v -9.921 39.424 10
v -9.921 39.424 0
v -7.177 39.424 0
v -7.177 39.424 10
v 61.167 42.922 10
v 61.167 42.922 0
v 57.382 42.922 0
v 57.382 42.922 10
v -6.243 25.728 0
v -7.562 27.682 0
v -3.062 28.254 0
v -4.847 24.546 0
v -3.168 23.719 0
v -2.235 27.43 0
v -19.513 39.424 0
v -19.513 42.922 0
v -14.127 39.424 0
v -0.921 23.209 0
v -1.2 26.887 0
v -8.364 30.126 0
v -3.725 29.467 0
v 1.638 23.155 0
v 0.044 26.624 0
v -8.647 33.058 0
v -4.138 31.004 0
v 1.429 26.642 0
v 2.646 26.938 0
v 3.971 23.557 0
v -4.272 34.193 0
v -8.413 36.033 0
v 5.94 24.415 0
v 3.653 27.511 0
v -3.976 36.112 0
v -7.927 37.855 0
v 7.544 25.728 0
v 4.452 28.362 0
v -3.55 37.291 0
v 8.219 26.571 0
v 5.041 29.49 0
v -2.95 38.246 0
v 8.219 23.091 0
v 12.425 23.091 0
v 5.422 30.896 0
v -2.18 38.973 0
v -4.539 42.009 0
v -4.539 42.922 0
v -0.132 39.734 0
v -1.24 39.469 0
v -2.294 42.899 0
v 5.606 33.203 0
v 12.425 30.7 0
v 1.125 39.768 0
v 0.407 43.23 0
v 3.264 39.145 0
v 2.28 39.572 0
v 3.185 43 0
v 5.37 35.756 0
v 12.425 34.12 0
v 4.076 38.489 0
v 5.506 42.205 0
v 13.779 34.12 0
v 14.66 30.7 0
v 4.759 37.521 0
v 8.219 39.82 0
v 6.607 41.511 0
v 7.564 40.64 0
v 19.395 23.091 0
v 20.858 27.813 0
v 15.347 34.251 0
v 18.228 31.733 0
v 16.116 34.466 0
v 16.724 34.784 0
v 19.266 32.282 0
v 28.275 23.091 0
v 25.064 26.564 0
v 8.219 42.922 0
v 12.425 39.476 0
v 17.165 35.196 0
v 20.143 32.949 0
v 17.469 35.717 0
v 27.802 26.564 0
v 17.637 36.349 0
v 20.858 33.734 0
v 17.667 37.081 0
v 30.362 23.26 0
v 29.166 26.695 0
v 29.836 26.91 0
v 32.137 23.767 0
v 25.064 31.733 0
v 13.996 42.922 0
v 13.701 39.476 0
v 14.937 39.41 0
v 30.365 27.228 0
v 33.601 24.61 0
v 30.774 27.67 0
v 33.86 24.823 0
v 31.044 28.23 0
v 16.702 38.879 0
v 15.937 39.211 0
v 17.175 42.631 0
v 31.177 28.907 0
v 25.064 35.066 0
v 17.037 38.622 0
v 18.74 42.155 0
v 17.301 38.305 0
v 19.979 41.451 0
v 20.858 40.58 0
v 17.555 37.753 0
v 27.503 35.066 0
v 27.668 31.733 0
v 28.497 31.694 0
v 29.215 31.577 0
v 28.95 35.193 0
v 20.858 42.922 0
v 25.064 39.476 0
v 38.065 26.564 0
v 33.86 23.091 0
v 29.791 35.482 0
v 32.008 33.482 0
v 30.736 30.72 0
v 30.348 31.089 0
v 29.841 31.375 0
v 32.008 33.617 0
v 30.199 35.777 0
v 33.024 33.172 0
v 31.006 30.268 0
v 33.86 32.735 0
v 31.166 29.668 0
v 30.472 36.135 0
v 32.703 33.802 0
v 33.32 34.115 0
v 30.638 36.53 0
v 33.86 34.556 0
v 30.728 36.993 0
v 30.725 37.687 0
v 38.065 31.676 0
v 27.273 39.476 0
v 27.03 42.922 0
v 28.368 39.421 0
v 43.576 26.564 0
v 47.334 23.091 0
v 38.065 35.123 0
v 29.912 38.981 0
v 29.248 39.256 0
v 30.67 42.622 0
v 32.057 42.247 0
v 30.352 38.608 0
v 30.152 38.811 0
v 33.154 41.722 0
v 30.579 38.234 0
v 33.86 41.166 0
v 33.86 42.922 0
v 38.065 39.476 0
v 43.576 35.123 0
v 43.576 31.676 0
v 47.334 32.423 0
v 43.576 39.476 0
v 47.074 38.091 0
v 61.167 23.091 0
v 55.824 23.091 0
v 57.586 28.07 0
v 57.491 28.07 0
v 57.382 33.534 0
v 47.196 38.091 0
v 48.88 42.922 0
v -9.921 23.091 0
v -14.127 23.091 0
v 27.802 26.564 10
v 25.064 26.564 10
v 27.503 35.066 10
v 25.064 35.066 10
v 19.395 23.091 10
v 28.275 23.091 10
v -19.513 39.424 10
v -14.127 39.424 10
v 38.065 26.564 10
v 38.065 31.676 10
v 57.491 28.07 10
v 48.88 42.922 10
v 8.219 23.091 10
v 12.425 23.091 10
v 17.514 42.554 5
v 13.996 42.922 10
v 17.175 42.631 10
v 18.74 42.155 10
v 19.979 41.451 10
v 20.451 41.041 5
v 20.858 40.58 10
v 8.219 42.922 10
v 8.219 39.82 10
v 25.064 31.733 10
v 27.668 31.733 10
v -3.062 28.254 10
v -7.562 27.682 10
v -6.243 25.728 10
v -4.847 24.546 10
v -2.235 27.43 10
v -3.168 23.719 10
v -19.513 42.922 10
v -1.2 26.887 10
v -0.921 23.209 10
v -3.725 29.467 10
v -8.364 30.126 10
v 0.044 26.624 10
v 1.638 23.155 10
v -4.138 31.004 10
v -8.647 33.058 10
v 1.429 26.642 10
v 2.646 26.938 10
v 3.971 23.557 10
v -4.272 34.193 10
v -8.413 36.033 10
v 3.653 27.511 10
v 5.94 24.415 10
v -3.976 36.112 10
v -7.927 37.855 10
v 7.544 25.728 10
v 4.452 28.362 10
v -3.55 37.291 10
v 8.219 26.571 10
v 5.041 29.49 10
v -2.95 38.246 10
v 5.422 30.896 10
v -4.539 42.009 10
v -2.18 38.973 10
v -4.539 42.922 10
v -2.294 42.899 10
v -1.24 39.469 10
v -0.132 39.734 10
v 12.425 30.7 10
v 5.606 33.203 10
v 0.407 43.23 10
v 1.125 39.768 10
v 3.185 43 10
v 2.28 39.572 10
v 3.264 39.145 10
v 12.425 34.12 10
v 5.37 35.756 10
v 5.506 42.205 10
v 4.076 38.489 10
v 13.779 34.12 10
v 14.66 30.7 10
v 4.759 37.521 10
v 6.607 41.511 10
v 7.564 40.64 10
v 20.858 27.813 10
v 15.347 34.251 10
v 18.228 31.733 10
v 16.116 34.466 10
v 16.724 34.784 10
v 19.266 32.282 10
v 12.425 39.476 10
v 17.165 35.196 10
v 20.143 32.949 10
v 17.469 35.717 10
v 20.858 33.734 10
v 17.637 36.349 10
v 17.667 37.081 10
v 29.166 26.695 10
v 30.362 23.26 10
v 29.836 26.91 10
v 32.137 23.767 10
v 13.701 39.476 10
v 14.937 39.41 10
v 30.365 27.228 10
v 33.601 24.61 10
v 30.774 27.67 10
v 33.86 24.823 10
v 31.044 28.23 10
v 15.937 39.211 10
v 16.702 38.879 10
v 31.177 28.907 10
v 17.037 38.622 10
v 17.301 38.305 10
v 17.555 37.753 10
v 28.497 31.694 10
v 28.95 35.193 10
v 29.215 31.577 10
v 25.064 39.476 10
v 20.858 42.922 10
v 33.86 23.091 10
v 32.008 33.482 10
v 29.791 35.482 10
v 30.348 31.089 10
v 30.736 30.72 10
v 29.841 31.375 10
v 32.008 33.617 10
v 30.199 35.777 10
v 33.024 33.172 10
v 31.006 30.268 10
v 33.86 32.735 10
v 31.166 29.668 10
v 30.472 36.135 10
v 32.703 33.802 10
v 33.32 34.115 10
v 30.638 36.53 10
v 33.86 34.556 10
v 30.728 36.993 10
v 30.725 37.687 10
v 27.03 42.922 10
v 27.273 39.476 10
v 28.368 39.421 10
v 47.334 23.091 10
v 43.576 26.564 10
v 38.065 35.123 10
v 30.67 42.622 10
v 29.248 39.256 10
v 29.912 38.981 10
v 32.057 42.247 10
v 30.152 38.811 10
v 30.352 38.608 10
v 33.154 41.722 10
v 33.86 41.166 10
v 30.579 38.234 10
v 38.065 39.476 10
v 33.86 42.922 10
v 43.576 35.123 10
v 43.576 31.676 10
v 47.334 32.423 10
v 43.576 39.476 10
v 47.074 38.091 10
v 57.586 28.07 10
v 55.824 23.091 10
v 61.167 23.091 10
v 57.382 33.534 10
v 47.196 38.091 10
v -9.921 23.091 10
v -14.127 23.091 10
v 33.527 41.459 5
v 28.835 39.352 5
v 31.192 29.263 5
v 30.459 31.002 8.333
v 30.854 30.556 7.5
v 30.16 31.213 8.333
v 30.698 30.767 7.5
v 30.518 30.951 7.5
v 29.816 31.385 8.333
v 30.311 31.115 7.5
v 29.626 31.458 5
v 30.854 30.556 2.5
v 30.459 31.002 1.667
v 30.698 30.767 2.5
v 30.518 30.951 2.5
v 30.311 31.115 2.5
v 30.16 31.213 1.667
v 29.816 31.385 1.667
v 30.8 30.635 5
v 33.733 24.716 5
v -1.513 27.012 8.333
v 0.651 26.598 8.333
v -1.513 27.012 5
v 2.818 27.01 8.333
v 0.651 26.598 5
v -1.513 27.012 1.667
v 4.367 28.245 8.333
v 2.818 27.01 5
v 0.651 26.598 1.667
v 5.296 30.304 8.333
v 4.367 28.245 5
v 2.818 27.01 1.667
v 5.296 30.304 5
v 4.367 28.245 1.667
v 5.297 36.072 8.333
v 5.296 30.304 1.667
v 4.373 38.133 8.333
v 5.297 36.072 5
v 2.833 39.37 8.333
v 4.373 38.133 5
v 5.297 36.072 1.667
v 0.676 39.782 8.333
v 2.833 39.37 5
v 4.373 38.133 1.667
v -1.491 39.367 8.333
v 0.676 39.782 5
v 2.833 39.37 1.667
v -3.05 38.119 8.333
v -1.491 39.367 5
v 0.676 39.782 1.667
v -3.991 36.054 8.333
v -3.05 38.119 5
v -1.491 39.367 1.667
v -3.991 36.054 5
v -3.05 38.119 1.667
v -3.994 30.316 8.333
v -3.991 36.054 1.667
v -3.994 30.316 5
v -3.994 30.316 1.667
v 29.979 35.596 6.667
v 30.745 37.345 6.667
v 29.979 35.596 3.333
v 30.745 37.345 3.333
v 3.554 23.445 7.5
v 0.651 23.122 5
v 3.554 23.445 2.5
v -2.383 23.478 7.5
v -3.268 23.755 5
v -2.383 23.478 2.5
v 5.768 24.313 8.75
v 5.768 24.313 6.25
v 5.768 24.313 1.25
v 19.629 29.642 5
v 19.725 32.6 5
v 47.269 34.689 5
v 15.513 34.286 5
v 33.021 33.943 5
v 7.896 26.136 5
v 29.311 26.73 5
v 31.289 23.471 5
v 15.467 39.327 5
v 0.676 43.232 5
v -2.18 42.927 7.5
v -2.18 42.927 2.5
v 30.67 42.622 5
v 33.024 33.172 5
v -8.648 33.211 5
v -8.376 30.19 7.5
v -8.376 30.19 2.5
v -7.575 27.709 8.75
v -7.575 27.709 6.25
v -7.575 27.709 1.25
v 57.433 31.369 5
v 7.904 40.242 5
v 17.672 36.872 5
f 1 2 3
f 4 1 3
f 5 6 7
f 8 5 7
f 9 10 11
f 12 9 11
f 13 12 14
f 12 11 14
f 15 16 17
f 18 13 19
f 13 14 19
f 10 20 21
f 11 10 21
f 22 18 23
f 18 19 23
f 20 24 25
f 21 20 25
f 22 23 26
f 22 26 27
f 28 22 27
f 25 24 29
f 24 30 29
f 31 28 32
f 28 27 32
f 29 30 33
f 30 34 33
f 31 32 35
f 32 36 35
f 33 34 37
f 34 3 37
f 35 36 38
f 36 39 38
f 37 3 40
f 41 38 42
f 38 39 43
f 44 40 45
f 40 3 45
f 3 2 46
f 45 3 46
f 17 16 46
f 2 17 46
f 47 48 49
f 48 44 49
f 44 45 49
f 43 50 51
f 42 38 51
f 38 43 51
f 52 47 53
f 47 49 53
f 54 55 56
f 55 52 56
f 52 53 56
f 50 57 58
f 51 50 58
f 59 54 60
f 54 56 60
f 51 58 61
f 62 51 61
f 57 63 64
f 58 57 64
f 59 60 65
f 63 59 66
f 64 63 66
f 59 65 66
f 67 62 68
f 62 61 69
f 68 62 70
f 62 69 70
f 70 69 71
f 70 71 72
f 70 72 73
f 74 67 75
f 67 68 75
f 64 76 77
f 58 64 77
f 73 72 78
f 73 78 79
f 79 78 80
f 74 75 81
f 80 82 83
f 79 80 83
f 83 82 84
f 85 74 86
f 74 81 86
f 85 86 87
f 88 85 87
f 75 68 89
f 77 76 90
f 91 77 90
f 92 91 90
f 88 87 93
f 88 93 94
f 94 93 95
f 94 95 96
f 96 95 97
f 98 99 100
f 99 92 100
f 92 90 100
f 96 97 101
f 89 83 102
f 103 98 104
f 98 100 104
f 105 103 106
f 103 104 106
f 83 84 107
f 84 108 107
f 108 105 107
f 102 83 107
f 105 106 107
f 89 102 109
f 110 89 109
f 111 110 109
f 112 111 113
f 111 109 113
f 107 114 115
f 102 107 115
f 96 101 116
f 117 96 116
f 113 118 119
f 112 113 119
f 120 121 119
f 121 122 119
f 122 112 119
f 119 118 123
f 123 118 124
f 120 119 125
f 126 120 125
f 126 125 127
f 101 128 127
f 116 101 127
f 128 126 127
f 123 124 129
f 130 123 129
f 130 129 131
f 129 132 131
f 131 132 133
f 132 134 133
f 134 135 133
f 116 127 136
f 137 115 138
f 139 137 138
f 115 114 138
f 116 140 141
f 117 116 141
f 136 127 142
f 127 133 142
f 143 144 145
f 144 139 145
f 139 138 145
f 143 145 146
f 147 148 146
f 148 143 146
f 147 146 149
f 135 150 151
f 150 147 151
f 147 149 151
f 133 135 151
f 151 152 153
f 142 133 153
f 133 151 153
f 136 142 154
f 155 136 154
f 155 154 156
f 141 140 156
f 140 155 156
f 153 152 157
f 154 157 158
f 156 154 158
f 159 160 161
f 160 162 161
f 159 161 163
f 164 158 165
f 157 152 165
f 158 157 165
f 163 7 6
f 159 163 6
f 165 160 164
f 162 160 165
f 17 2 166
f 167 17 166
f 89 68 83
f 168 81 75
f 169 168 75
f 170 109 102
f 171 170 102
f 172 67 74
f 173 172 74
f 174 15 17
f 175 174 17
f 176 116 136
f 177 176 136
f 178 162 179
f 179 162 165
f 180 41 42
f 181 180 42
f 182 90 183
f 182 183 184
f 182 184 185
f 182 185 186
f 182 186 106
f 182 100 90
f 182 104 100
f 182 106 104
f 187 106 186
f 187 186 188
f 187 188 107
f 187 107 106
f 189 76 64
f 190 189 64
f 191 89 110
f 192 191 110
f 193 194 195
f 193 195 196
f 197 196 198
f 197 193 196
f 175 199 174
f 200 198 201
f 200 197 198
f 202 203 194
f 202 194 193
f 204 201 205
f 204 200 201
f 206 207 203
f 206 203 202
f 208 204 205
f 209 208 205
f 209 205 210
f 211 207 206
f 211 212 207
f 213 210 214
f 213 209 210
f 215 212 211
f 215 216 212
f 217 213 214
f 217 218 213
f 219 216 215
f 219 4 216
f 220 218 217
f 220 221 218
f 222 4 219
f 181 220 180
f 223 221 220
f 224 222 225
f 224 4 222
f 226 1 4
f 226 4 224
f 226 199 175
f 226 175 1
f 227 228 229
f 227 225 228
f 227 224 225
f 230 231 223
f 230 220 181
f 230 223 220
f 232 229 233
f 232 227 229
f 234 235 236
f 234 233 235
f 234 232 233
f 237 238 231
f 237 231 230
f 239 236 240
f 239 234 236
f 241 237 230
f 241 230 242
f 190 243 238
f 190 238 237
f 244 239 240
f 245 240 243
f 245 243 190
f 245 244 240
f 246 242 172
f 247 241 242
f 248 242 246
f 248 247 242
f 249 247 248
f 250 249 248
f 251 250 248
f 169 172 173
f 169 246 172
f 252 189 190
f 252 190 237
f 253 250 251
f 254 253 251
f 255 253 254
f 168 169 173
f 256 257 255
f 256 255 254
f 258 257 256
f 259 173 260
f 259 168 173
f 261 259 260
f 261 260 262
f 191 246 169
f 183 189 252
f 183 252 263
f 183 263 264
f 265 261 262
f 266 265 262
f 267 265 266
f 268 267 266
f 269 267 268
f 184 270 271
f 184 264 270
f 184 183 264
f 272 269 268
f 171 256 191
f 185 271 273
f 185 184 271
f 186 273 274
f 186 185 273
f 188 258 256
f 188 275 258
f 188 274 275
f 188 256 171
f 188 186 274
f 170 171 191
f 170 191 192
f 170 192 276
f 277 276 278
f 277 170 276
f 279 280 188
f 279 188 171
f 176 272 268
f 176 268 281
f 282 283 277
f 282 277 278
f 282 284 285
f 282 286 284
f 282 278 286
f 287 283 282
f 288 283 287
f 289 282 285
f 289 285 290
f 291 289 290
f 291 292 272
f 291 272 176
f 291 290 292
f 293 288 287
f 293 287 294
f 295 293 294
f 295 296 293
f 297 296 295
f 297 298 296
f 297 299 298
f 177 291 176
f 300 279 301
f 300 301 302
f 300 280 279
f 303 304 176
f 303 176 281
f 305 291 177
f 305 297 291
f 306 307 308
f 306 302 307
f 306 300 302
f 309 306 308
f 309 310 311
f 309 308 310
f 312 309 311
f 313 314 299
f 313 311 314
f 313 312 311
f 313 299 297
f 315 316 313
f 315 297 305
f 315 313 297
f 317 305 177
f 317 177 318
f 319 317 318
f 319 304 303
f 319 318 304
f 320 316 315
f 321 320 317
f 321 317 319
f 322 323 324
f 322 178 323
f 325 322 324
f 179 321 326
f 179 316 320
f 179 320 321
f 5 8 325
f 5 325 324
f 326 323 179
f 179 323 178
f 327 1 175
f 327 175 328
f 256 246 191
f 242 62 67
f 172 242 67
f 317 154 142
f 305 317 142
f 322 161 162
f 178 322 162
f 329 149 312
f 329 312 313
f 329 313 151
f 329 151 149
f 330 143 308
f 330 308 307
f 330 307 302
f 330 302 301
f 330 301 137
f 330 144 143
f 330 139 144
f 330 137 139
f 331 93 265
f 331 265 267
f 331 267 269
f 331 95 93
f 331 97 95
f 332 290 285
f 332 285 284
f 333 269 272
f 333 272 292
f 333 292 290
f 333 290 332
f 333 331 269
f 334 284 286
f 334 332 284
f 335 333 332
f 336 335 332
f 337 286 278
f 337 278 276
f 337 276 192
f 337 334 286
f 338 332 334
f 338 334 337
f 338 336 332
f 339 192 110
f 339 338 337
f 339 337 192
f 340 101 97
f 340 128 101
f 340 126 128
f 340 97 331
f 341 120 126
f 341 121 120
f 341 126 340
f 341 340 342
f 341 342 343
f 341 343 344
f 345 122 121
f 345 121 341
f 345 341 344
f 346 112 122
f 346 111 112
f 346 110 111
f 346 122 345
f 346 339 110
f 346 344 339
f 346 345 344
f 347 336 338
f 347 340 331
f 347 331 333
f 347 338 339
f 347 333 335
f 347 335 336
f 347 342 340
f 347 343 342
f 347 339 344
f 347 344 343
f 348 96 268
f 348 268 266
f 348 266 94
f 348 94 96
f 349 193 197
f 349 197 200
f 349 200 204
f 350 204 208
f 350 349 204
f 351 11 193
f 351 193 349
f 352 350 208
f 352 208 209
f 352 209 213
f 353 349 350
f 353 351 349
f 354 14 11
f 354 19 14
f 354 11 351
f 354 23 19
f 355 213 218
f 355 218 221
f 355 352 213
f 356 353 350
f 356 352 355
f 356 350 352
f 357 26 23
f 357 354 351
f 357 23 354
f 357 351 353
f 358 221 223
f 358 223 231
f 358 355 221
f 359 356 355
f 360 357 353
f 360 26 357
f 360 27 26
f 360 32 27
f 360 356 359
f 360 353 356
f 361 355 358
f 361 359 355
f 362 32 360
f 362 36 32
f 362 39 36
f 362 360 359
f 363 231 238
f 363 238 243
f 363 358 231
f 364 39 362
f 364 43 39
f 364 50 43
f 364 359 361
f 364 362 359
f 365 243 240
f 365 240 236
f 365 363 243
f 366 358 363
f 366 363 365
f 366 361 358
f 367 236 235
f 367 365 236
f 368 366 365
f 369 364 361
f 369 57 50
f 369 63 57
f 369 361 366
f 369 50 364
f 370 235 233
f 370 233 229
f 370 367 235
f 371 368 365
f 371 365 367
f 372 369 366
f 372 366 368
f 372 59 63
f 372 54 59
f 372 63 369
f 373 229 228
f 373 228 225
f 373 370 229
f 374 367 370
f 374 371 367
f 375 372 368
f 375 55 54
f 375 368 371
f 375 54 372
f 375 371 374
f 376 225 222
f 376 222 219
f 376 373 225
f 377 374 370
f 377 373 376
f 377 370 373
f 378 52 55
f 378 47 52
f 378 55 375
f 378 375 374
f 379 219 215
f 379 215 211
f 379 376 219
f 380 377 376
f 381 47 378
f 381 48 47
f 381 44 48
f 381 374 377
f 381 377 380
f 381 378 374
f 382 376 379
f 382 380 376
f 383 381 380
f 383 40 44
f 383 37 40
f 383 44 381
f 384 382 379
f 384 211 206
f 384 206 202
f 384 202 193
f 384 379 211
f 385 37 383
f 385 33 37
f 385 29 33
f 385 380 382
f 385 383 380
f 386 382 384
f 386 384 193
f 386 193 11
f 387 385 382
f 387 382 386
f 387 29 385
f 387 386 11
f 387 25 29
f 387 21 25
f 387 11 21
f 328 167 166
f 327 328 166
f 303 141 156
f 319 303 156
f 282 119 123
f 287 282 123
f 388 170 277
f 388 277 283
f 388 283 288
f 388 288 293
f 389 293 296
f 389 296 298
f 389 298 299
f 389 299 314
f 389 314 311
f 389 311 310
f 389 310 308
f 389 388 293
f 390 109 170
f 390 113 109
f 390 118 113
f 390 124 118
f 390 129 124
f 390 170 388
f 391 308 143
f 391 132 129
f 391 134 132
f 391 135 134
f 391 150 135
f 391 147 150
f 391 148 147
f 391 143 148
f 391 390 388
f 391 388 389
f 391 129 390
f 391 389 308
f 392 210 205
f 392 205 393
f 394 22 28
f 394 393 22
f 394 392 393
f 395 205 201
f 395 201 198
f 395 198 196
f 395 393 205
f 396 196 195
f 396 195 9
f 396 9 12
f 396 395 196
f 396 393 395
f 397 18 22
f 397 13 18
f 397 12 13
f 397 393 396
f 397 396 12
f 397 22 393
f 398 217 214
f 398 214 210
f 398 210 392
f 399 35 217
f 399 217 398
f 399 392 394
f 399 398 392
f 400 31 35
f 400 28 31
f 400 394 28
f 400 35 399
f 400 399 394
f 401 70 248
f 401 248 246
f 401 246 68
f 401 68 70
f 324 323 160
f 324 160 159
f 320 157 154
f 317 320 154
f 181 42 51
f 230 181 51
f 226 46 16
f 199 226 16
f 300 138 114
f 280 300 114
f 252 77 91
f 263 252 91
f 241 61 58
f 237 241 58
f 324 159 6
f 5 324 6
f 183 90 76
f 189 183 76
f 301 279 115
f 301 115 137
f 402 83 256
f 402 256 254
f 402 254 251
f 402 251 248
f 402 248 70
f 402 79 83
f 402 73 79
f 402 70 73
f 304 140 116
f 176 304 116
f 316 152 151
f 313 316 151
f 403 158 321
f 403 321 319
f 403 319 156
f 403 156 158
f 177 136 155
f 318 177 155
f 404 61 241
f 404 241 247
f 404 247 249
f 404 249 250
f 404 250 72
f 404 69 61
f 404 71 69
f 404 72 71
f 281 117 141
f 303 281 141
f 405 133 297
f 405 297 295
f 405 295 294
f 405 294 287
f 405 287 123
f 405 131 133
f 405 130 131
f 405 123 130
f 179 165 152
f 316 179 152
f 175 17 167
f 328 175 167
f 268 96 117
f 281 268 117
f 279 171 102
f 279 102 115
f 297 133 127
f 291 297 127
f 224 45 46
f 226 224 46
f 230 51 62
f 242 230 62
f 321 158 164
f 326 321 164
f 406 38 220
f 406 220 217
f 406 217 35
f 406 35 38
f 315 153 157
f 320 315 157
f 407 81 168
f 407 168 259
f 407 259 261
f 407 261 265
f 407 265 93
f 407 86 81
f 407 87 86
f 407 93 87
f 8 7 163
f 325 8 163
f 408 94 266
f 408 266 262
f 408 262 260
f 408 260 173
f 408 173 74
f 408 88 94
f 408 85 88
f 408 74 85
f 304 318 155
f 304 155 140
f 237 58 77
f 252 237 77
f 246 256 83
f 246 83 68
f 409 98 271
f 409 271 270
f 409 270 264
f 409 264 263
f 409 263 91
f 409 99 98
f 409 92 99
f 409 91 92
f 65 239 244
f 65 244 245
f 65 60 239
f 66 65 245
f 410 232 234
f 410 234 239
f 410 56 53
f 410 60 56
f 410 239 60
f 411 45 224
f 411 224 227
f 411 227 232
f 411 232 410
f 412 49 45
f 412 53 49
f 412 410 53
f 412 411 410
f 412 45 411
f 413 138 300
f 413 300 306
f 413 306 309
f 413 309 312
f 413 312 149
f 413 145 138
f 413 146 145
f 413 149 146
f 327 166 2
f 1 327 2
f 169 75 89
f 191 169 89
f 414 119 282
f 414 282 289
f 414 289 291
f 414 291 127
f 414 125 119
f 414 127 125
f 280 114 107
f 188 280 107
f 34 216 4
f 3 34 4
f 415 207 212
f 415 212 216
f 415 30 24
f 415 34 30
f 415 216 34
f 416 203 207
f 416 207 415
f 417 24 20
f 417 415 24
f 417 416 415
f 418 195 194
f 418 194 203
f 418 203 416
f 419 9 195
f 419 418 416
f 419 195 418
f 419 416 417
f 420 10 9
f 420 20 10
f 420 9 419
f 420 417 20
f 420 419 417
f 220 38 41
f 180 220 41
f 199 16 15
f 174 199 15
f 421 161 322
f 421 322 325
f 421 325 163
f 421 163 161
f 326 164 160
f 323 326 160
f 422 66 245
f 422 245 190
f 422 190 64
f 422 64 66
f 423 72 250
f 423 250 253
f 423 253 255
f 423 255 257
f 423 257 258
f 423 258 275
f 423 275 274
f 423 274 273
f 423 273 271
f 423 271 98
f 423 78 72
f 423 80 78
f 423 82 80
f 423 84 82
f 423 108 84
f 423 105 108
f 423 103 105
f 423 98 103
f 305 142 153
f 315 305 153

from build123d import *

# Parameters (mm, degrees)
F0_W     = 1.703125
F0_H     = 3.4461805556
F0_H_2   = 3.4722222222
F0_W_2   = 1.2039930556
F1_DEPTH = 10


with BuildPart() as f1:
    # F0 (on Top) → F1 (new body)
    with BuildSketch(Plane.XY):
        with BuildLine():
            Line((-14.1271259541, 23.0913977325), (-9.9213967874, 23.0913977325))
            Line((-9.9213967874, 23.0913977325), (-9.9213967874, 39.4238630103))
            Line((-9.9213967874, 39.4238630103), (-7.1772301491, 39.4238630103))
            add(Edge.make_bspline(
                [(-7.1772301491, 39.4238630103), (-6.7647873195, 40.0977349004), (-6.2366745652, 40.6609615346)],
                knots=[0.7809749458, 0.7809749458, 0.7809749458, 1, 1, 1], degree=2))
            add(Edge.make_bspline(
                [(-6.2366745652, 40.6609615346), (-5.4886607191, 41.4587103438), (-4.539452343, 42.0089775379)],
                knots=[0, 0, 0, 0.3102249885, 0.3102249885, 0.3102249885], degree=2))
            Line((-4.539452343, 42.0089775379), (-4.539452343, 42.9221268992))
            Line((-4.539452343, 42.9221268992), (-19.5134106763, 42.9221268992))
            Line((-19.5134106763, 42.9221268992), (-19.5134106763, 39.4238630103))
            Line((-19.5134106763, 39.4238630103), (-14.1271259541, 39.4238630103))
            Line((-14.1271259541, 39.4238630103), (-14.1271259541, 23.0913977325))
        make_face()
        with BuildLine():
            add(Edge.make_bspline(
                [(-7.1772301491, 39.4238630103), (-6.7647873195, 40.0977349004), (-6.2366745652, 40.6609615346)],
                knots=[0.7809749458, 0.7809749458, 0.7809749458, 1, 1, 1], degree=2))
            Line((-7.1772301491, 39.4238630103), (-4.539452343, 39.4238630103))
            Line((-4.539452343, 39.4238630103), (-4.539452343, 42.0089775379))
            add(Edge.make_bspline(
                [(-6.2366745652, 40.6609615346), (-5.4886607191, 41.4587103438), (-4.539452343, 42.0089775379)],
                knots=[0, 0, 0, 0.3102249885, 0.3102249885, 0.3102249885], degree=2))
        make_face()
        with BuildLine():
            Line((-4.539452343, 39.4238630103), (-7.1772301491, 39.4238630103))
            add(Edge.make_bspline(
                [(-8.6478724819, 33.2114715172), (-8.6478724819, 37.0210462872), (-7.1772301491, 39.4238630103)],
                knots=[0, 0, 0, 0.7809749458, 0.7809749458, 0.7809749458], degree=2))
            add(Edge.make_bspline(
                [(-6.2430873256, 25.727780111), (-8.6478724819, 28.3334984269), (-8.6478724819, 33.2114715172)],
                knots=[0, 0, 0, 1, 1, 1], degree=2))
            add(Edge.make_bspline(
                [(0.6506301223, 23.122061795), (-3.8383021694, 23.122061795), (-6.2430873256, 25.727780111)],
                knots=[0, 0, 0, 1, 1, 1], degree=2))
            add(Edge.make_bspline(
                [(7.5443475702, 25.727780111), (5.139562414, 23.122061795), (0.6506301223, 23.122061795)],
                knots=[0, 0, 0, 1, 1, 1], degree=2))
            add(Edge.make_bspline(
                [(8.2189894973, 26.5705920502), (7.9093722612, 26.1233046428), (7.5443475702, 25.727780111)],
                knots=[0.8482090219, 0.8482090219, 0.8482090219, 1, 1, 1], degree=2))
            Line((8.2189894973, 26.5705920502), (8.2189894973, 39.8201993237))
            add(Edge.make_bspline(
                [(7.5635858515, 40.6395856665), (7.9175476868, 40.2548583312), (8.2189894973, 39.8201993237)],
                knots=[0, 0, 0, 0.1483776483, 0.1483776483, 0.1483776483], degree=2))
            add(Edge.make_bspline(
                [(0.676281164, 43.2324784617), (5.1780389765, 43.2324784617), (7.5635858515, 40.6395856665)],
                knots=[0, 0, 0, 1, 1, 1], degree=2))
            add(Edge.make_bspline(
                [(-4.539452343, 42.0089775379), (-2.4289188827, 43.2324784617), (0.676281164, 43.2324784617)],
                knots=[0.3102249885, 0.3102249885, 0.3102249885, 1, 1, 1], degree=2))
            Line((-4.539452343, 42.0089775379), (-4.539452343, 39.4238630103))
        make_face()
        with BuildLine():
            add(Edge.make_bspline(
                [(-4.304296093, 33.1858204756), (-4.304296093, 29.9110374894), (-3.0623581589, 28.2544077151)],
                knots=[0, 0, 0, 1, 1, 1], degree=2))
            add(Edge.make_bspline(
                [(-3.0495326381, 38.1193708228), (-4.304296093, 36.4563282881), (-4.304296093, 33.1858204756)],
                knots=[0, 0, 0, 1, 1, 1], degree=2))
            add(Edge.make_bspline(
                [(0.676281164, 39.7824133575), (-1.7947691832, 39.7824133575), (-3.0495326381, 38.1193708228)],
                knots=[0, 0, 0, 1, 1, 1], degree=2))
            add(Edge.make_bspline(
                [(5.6055563376, 33.1858204756), (5.6055563376, 39.7824133575), (0.676281164, 39.7824133575)],
                knots=[0, 0, 0, 1, 1, 1], degree=2))
            add(Edge.make_bspline(
                [(0.6506301223, 26.5977779408), (5.6055563376, 26.5977779408), (5.6055563376, 33.1858204756)],
                knots=[0, 0, 0, 1, 1, 1], degree=2))
            add(Edge.make_bspline(
                [(-3.0623581589, 28.2544077151), (-1.8204202249, 26.5977779408), (0.6506301223, 26.5977779408)],
                knots=[0, 0, 0, 1, 1, 1], degree=2))
        make_face(mode=Mode.SUBTRACT)
        with BuildLine():
            Line((8.2189894973, 42.9221268992), (8.2189894973, 39.8201993237))
            add(Edge.make_bspline(
                [(8.2189894973, 39.8201993237), (9.9491327265, 37.3254480565), (9.9491327265, 33.1858204756)],
                knots=[0.1483776483, 0.1483776483, 0.1483776483, 1, 1, 1], degree=2))
            add(Edge.make_bspline(
                [(9.9491327265, 33.1858204756), (9.9491327265, 29.0700371367), (8.2189894973, 26.5705920502)],
                knots=[0, 0, 0, 0.8482090219, 0.8482090219, 0.8482090219], degree=2))
            Line((8.2189894973, 26.5705920502), (8.2189894973, 23.0913977325))
            Line((8.2189894973, 23.0913977325), (12.424718664, 23.0913977325))
            Line((12.424718664, 23.0913977325), (12.424718664, 30.6999046769))
            Line((12.424718664, 30.6999046769), (14.6599617195, 30.6999046769))
            Line((14.6599617195, 30.6999046769), (19.3952047751, 23.0913977325))
            Line((19.3952047751, 23.0913977325), (20.8578783862, 23.0913977325))
            Line((20.8578783862, 23.0913977325), (20.8578783862, 27.8130209348))
            add(Edge.make_bspline(
                [(18.2276700529, 31.7328907881), (19.7150733371, 29.5118748375), (20.8578783862, 27.8130209348)],
                knots=[0, 0, 0, 0.3320714309, 0.3320714309, 0.3320714309], degree=2))
            add(Edge.make_bspline(
                [(20.8578783862, 33.7341557337), (19.9062738548, 32.4670221806), (18.2276700529, 31.7328907881)],
                knots=[0.0497535234, 0.0497535234, 0.0497535234, 1, 1, 1], degree=2))
            Line((20.8578783862, 33.7341557337), (20.8578783862, 40.5795415424))
            add(Edge.make_bspline(
                [(19.9789721362, 41.4507727325), (20.484312025, 41.0670992223), (20.8578783862, 40.5795415424)],
                knots=[0, 0, 0, 0.2607621733, 0.2607621733, 0.2607621733], degree=2))
            add(Edge.make_bspline(
                [(13.9958992195, 42.9221268992), (18.0410381084, 42.9221268992), (19.9789721362, 41.4507727325)],
                knots=[0, 0, 0, 1, 1, 1], degree=2))
            Line((13.9958992195, 42.9221268992), (8.2189894973, 42.9221268992))
        make_face()
        with BuildLine():
            Line((13.7788853306, 34.1200435658), (12.424718664, 34.1200435658))
            Line((12.424718664, 34.1200435658), (12.424718664, 39.4759463436))
            Line((12.424718664, 39.4759463436), (13.7007603306, 39.4759463436))
            add(Edge.make_bspline(
                [(16.702062414, 38.8791581492), (15.7320103306, 39.4759463436), (13.7007603306, 39.4759463436)],
                knots=[0, 0, 0, 1, 1, 1], degree=2))
            add(Edge.make_bspline(
                [(17.6721144973, 36.8717796769), (17.6721144973, 38.2823699547), (16.702062414, 38.8791581492)],
                knots=[0, 0, 0, 1, 1, 1], degree=2))
            add(Edge.make_bspline(
                [(16.7237638029, 34.7841060658), (17.6721144973, 35.4481685658), (17.6721144973, 36.8717796769)],
                knots=[0, 0, 0, 1, 1, 1], degree=2))
            add(Edge.make_bspline(
                [(13.7788853306, 34.1200435658), (15.7754131084, 34.1200435658), (16.7237638029, 34.7841060658)],
                knots=[0, 0, 0, 1, 1, 1], degree=2))
        make_face(mode=Mode.SUBTRACT)
        with BuildLine():
            add(Edge.make_bspline(
                [(8.2189894973, 39.8201993237), (9.9491327265, 37.3254480565), (9.9491327265, 33.1858204756)],
                knots=[0.1483776483, 0.1483776483, 0.1483776483, 1, 1, 1], degree=2))
            Line((8.2189894973, 39.8201993237), (8.2189894973, 26.5705920502))
            add(Edge.make_bspline(
                [(9.9491327265, 33.1858204756), (9.9491327265, 29.0700371367), (8.2189894973, 26.5705920502)],
                knots=[0, 0, 0, 0.8482090219, 0.8482090219, 0.8482090219], degree=2))
        make_face()
        with BuildLine():
            Line((20.8578783862, 42.9221268992), (20.8578783862, 40.5795415424))
            add(Edge.make_bspline(
                [(20.8578783862, 40.5795415424), (21.916906164, 39.1973584019), (21.916906164, 36.9802866214)],
                knots=[0.2607621733, 0.2607621733, 0.2607621733, 1, 1, 1], degree=2))
            add(Edge.make_bspline(
                [(21.916906164, 36.9802866214), (21.916906164, 35.2311546769), (20.9555346362, 33.8683074547)],
                knots=[0, 0, 0, 1, 1, 1], degree=2))
            add(Edge.make_bspline(
                [(20.9555346362, 33.8683074547), (20.9077030154, 33.8005010035), (20.8578783862, 33.7341557337)],
                knots=[0, 0, 0, 0.0497535234, 0.0497535234, 0.0497535234], degree=2))
            Line((20.8578783862, 33.7341557337), (20.8578783862, 27.8130209348))
            add(Edge.make_bspline(
                [(20.8578783862, 27.8130209348), (23.1565167822, 24.395945719), (24.0610033862, 23.0913977325)],
                knots=[0.3320714309, 0.3320714309, 0.3320714309, 1, 1, 1], degree=2))
            Line((24.0610033862, 23.0913977325), (28.2754131084, 23.0913977325))
            add(Edge.make_bspline(
                [(33.6009339418, 24.6104949547), (31.6391283862, 23.0913977325), (28.2754131084, 23.0913977325)],
                knots=[0, 0, 0, 1, 1, 1], degree=2))
            add(Edge.make_bspline(
                [(33.8596144973, 24.8234397706), (33.7348445094, 24.714186766), (33.6009339418, 24.6104949547)],
                knots=[0.931741162, 0.931741162, 0.931741162, 1, 1, 1], degree=2))
            Line((33.8596144973, 24.8234397706), (33.8596144973, 32.7348988606))
            add(Edge.make_bspline(
                [(32.0080519973, 33.4820227325), (33.1147312003, 33.2346773807), (33.8596144973, 32.7348988606)],
                knots=[0, 0, 0, 0.5875089594, 0.5875089594, 0.5875089594], degree=2))
            Line((32.0080519973, 33.4820227325), (32.0080519973, 33.6165713436))
            add(Edge.make_bspline(
                [(33.8596144973, 34.5555220159), (33.1076799022, 33.7992681428), (32.0080519973, 33.6165713436)],
                knots=[0.2057859897, 0.2057859897, 0.2057859897, 1, 1, 1], degree=2))
            Line((33.8596144973, 34.5555220159), (33.8596144973, 41.1659203966))
            add(Edge.make_bspline(
                [(33.1538853306, 41.7220400936), (33.5473821133, 41.4741998649), (33.8596144973, 41.1659203966)],
                knots=[0, 0, 0, 0.2065185848, 0.2065185848, 0.2065185848], degree=2))
            add(Edge.make_bspline(
                [(27.0297533862, 42.9221268992), (31.2485033862, 42.9221268992), (33.1538853306, 41.7220400936)],
                knots=[0, 0, 0, 1, 1, 1], degree=2))
            Line((27.0297533862, 42.9221268992), (20.8578783862, 42.9221268992))
        make_face()
        with BuildLine():
            Line((25.0636075529, 26.5636199547), (25.0636075529, 31.7328907881))
            Line((25.0636075529, 31.7328907881), (27.6677742195, 31.7328907881))
            add(Edge.make_bspline(
                [(31.1920797751, 29.2632727325), (31.1920797751, 31.7328907881), (27.6677742195, 31.7328907881)],
                knots=[0, 0, 0, 1, 1, 1], degree=2))
            add(Edge.make_bspline(
                [(30.3652568584, 27.2276824547), (31.1920797751, 27.8917449547), (31.1920797751, 29.2632727325)],
                knots=[0, 0, 0, 1, 1, 1], degree=2))
            add(Edge.make_bspline(
                [(27.8023228306, 26.5636199547), (29.5384339418, 26.5636199547), (30.3652568584, 27.2276824547)],
                knots=[0, 0, 0, 1, 1, 1], degree=2))
            Line((27.8023228306, 26.5636199547), (25.0636075529, 26.5636199547))
        make_face(mode=Mode.SUBTRACT)
        with BuildLine():
            Line((27.502843664, 35.0662241214), (25.0636075529, 35.0662241214))
            Line((25.0636075529, 35.0662241214), (25.0636075529, 39.4759463436))
            Line((25.0636075529, 39.4759463436), (27.2728089418, 39.4759463436))
            add(Edge.make_bspline(
                [(29.9116978306, 38.9811546769), (29.0783644973, 39.4759463436), (27.2728089418, 39.4759463436)],
                knots=[0, 0, 0, 1, 1, 1], degree=2))
            add(Edge.make_bspline(
                [(30.745031164, 37.3448699547), (30.745031164, 38.4863630103), (29.9116978306, 38.9811546769)],
                knots=[0, 0, 0, 1, 1, 1], degree=2))
            add(Edge.make_bspline(
                [(29.9789721362, 35.5957380103), (30.745031164, 36.1252518992), (30.745031164, 37.3448699547)],
                knots=[0, 0, 0, 1, 1, 1], degree=2))
            add(Edge.make_bspline(
                [(27.502843664, 35.0662241214), (29.2129131084, 35.0662241214), (29.9789721362, 35.5957380103)],
                knots=[0, 0, 0, 1, 1, 1], degree=2))
        make_face(mode=Mode.SUBTRACT)
        with BuildLine():
            add(Edge.make_bspline(
                [(20.8578783862, 40.5795415424), (21.916906164, 39.1973584019), (21.916906164, 36.9802866214)],
                knots=[0.2607621733, 0.2607621733, 0.2607621733, 1, 1, 1], degree=2))
            Line((20.8578783862, 40.5795415424), (20.8578783862, 33.7341557337))
            add(Edge.make_bspline(
                [(20.9555346362, 33.8683074547), (20.9077030154, 33.8005010035), (20.8578783862, 33.7341557337)],
                knots=[0, 0, 0, 0.0497535234, 0.0497535234, 0.0497535234], degree=2))
            add(Edge.make_bspline(
                [(21.916906164, 36.9802866214), (21.916906164, 35.2311546769), (20.9555346362, 33.8683074547)],
                knots=[0, 0, 0, 1, 1, 1], degree=2))
        make_face()
        with BuildLine():
            add(Edge.make_bspline(
                [(20.8578783862, 27.8130209348), (23.1565167822, 24.395945719), (24.0610033862, 23.0913977325)],
                knots=[0.3320714309, 0.3320714309, 0.3320714309, 1, 1, 1], degree=2))
            Line((20.8578783862, 27.8130209348), (20.8578783862, 23.0913977325))
            Line((20.8578783862, 23.0913977325), (24.0610033862, 23.0913977325))
        make_face()
        with BuildLine():
            Line((33.8596144973, 42.9221268992), (33.8596144973, 41.1659203966))
            add(Edge.make_bspline(
                [(33.8596144973, 41.1659203966), (35.0592672751, 39.9814554294), (35.0592672751, 37.9047657881)],
                knots=[0.2065185848, 0.2065185848, 0.2065185848, 1, 1, 1], degree=2))
            add(Edge.make_bspline(
                [(35.0592672751, 37.9047657881), (35.0592672751, 36.1252518992), (34.2259339418, 34.9859289825)],
                knots=[0, 0, 0, 1, 1, 1], degree=2))
            add(Edge.make_bspline(
                [(34.2259339418, 34.9859289825), (34.054445617, 34.7514722885), (33.8596144973, 34.5555220159)],
                knots=[0, 0, 0, 0.2057859897, 0.2057859897, 0.2057859897], degree=2))
            Line((33.8596144973, 34.5555220159), (33.8596144973, 32.7348988606))
            add(Edge.make_bspline(
                [(33.8596144973, 32.7348988606), (34.3825983284, 32.3840035107), (34.7272360251, 31.9086720381)],
                knots=[0.5875089594, 0.5875089594, 0.5875089594, 1, 1, 1], degree=2))
            add(Edge.make_bspline(
                [(34.7272360251, 31.9086720381), (35.5627394973, 30.7563282881), (35.5627394973, 28.8422657881)],
                knots=[0, 0, 0, 1, 1, 1], degree=2))
            add(Edge.make_bspline(
                [(35.5627394973, 28.8422657881), (35.5627394973, 26.3147561256), (33.8596144973, 24.8234397706)],
                knots=[0, 0, 0, 0.931741162, 0.931741162, 0.931741162], degree=2))
            Line((33.8596144973, 24.8234397706), (33.8596144973, 23.0913977325))
            Line((33.8596144973, 23.0913977325), (43.5757603306, 23.0913977325))
            Line((43.5757603306, 23.0913977325), (43.5757603306, 26.5636199547))
            Line((43.5757603306, 26.5636199547), (38.065343664, 26.5636199547))
            Line((38.065343664, 26.5636199547), (38.065343664, 31.6764671769))
            Line((38.065343664, 31.6764671769), (43.5757603306, 31.6764671769))
            Line((43.5757603306, 31.6764671769), (43.5757603306, 35.1226477325))
            Line((43.5757603306, 35.1226477325), (38.065343664, 35.1226477325))
            Line((38.065343664, 35.1226477325), (38.065343664, 39.4759463436))
            Line((38.065343664, 39.4759463436), (43.5757603306, 39.4759463436))
            Line((43.5757603306, 39.4759463436), (43.5757603306, 42.9221268992))
            Line((43.5757603306, 42.9221268992), (33.8596144973, 42.9221268992))
        make_face()
        with BuildLine():
            add(Edge.make_bspline(
                [(33.8596144973, 41.1659203966), (35.0592672751, 39.9814554294), (35.0592672751, 37.9047657881)],
                knots=[0.2065185848, 0.2065185848, 0.2065185848, 1, 1, 1], degree=2))
            Line((33.8596144973, 41.1659203966), (33.8596144973, 34.5555220159))
            add(Edge.make_bspline(
                [(34.2259339418, 34.9859289825), (34.054445617, 34.7514722885), (33.8596144973, 34.5555220159)],
                knots=[0, 0, 0, 0.2057859897, 0.2057859897, 0.2057859897], degree=2))
            add(Edge.make_bspline(
                [(35.0592672751, 37.9047657881), (35.0592672751, 36.1252518992), (34.2259339418, 34.9859289825)],
                knots=[0, 0, 0, 1, 1, 1], degree=2))
        make_face()
        with BuildLine():
            Line((33.8596144973, 32.7348988606), (33.8596144973, 24.8234397706))
            add(Edge.make_bspline(
                [(35.5627394973, 28.8422657881), (35.5627394973, 26.3147561256), (33.8596144973, 24.8234397706)],
                knots=[0, 0, 0, 0.931741162, 0.931741162, 0.931741162], degree=2))
            add(Edge.make_bspline(
                [(34.7272360251, 31.9086720381), (35.5627394973, 30.7563282881), (35.5627394973, 28.8422657881)],
                knots=[0, 0, 0, 1, 1, 1], degree=2))
            add(Edge.make_bspline(
                [(33.8596144973, 32.7348988606), (34.3825983284, 32.3840035107), (34.7272360251, 31.9086720381)],
                knots=[0.5875089594, 0.5875089594, 0.5875089594, 1, 1, 1], degree=2))
        make_face()
        with Locations((44.4273228306, 41.1990366214)):
            Rectangle(F0_W, F0_H)
        with BuildLine():
            Line((48.8795797751, 42.9221268992), (45.2788853306, 42.9221268992))
            Line((45.2788853306, 42.9221268992), (45.2788853306, 39.4759463436))
            Line((45.2788853306, 39.4759463436), (43.5757603306, 39.4759463436))
            Line((43.5757603306, 39.4759463436), (43.5757603306, 35.1226477325))
            Line((43.5757603306, 35.1226477325), (44.7797533862, 35.1226477325))
            Line((44.7797533862, 35.1226477325), (44.7797533862, 31.6764671769))
            Line((44.7797533862, 31.6764671769), (43.5757603306, 31.6764671769))
            Line((43.5757603306, 31.6764671769), (43.5757603306, 26.5636199547))
            Line((43.5757603306, 26.5636199547), (45.2788853306, 26.5636199547))
            Line((45.2788853306, 26.5636199547), (45.2788853306, 23.0913977325))
            Line((45.2788853306, 23.0913977325), (47.3344408862, 23.0913977325))
            Line((47.3344408862, 23.0913977325), (47.3344408862, 32.4229949547))
            add(Edge.make_bspline(
                [(47.0740242195, 38.0913977325), (47.3344408862, 34.1200435658), (47.3344408862, 32.4229949547)],
                knots=[0, 0, 0, 1, 1, 1], degree=2))
            Line((47.0740242195, 38.0913977325), (47.1955519973, 38.0913977325))
            Line((47.1955519973, 38.0913977325), (55.8240242195, 23.0913977325))
            Line((55.8240242195, 23.0913977325), (61.166906164, 23.0913977325))
            Line((61.166906164, 23.0913977325), (61.166906164, 42.9221268992))
            Line((61.166906164, 42.9221268992), (57.3821839418, 42.9221268992))
            Line((57.3821839418, 42.9221268992), (57.3821839418, 33.5341060658))
            add(Edge.make_bspline(
                [(57.5861769973, 28.0696963436), (57.3821839418, 31.9368838436), (57.3821839418, 33.5341060658)],
                knots=[0, 0, 0, 1, 1, 1], degree=2))
            Line((57.5861769973, 28.0696963436), (57.4906908862, 28.0696963436))
            Line((57.4906908862, 28.0696963436), (48.8795797751, 42.9221268992))
        make_face()
        with Locations((44.4273228306, 24.8275088436)):
            Rectangle(F0_W, F0_H_2)
        with Locations((44.1777568584, 33.3995574547)):
            Rectangle(F0_W_2, F0_H)
    extrude(amount=F1_DEPTH)


solid = f1.part
